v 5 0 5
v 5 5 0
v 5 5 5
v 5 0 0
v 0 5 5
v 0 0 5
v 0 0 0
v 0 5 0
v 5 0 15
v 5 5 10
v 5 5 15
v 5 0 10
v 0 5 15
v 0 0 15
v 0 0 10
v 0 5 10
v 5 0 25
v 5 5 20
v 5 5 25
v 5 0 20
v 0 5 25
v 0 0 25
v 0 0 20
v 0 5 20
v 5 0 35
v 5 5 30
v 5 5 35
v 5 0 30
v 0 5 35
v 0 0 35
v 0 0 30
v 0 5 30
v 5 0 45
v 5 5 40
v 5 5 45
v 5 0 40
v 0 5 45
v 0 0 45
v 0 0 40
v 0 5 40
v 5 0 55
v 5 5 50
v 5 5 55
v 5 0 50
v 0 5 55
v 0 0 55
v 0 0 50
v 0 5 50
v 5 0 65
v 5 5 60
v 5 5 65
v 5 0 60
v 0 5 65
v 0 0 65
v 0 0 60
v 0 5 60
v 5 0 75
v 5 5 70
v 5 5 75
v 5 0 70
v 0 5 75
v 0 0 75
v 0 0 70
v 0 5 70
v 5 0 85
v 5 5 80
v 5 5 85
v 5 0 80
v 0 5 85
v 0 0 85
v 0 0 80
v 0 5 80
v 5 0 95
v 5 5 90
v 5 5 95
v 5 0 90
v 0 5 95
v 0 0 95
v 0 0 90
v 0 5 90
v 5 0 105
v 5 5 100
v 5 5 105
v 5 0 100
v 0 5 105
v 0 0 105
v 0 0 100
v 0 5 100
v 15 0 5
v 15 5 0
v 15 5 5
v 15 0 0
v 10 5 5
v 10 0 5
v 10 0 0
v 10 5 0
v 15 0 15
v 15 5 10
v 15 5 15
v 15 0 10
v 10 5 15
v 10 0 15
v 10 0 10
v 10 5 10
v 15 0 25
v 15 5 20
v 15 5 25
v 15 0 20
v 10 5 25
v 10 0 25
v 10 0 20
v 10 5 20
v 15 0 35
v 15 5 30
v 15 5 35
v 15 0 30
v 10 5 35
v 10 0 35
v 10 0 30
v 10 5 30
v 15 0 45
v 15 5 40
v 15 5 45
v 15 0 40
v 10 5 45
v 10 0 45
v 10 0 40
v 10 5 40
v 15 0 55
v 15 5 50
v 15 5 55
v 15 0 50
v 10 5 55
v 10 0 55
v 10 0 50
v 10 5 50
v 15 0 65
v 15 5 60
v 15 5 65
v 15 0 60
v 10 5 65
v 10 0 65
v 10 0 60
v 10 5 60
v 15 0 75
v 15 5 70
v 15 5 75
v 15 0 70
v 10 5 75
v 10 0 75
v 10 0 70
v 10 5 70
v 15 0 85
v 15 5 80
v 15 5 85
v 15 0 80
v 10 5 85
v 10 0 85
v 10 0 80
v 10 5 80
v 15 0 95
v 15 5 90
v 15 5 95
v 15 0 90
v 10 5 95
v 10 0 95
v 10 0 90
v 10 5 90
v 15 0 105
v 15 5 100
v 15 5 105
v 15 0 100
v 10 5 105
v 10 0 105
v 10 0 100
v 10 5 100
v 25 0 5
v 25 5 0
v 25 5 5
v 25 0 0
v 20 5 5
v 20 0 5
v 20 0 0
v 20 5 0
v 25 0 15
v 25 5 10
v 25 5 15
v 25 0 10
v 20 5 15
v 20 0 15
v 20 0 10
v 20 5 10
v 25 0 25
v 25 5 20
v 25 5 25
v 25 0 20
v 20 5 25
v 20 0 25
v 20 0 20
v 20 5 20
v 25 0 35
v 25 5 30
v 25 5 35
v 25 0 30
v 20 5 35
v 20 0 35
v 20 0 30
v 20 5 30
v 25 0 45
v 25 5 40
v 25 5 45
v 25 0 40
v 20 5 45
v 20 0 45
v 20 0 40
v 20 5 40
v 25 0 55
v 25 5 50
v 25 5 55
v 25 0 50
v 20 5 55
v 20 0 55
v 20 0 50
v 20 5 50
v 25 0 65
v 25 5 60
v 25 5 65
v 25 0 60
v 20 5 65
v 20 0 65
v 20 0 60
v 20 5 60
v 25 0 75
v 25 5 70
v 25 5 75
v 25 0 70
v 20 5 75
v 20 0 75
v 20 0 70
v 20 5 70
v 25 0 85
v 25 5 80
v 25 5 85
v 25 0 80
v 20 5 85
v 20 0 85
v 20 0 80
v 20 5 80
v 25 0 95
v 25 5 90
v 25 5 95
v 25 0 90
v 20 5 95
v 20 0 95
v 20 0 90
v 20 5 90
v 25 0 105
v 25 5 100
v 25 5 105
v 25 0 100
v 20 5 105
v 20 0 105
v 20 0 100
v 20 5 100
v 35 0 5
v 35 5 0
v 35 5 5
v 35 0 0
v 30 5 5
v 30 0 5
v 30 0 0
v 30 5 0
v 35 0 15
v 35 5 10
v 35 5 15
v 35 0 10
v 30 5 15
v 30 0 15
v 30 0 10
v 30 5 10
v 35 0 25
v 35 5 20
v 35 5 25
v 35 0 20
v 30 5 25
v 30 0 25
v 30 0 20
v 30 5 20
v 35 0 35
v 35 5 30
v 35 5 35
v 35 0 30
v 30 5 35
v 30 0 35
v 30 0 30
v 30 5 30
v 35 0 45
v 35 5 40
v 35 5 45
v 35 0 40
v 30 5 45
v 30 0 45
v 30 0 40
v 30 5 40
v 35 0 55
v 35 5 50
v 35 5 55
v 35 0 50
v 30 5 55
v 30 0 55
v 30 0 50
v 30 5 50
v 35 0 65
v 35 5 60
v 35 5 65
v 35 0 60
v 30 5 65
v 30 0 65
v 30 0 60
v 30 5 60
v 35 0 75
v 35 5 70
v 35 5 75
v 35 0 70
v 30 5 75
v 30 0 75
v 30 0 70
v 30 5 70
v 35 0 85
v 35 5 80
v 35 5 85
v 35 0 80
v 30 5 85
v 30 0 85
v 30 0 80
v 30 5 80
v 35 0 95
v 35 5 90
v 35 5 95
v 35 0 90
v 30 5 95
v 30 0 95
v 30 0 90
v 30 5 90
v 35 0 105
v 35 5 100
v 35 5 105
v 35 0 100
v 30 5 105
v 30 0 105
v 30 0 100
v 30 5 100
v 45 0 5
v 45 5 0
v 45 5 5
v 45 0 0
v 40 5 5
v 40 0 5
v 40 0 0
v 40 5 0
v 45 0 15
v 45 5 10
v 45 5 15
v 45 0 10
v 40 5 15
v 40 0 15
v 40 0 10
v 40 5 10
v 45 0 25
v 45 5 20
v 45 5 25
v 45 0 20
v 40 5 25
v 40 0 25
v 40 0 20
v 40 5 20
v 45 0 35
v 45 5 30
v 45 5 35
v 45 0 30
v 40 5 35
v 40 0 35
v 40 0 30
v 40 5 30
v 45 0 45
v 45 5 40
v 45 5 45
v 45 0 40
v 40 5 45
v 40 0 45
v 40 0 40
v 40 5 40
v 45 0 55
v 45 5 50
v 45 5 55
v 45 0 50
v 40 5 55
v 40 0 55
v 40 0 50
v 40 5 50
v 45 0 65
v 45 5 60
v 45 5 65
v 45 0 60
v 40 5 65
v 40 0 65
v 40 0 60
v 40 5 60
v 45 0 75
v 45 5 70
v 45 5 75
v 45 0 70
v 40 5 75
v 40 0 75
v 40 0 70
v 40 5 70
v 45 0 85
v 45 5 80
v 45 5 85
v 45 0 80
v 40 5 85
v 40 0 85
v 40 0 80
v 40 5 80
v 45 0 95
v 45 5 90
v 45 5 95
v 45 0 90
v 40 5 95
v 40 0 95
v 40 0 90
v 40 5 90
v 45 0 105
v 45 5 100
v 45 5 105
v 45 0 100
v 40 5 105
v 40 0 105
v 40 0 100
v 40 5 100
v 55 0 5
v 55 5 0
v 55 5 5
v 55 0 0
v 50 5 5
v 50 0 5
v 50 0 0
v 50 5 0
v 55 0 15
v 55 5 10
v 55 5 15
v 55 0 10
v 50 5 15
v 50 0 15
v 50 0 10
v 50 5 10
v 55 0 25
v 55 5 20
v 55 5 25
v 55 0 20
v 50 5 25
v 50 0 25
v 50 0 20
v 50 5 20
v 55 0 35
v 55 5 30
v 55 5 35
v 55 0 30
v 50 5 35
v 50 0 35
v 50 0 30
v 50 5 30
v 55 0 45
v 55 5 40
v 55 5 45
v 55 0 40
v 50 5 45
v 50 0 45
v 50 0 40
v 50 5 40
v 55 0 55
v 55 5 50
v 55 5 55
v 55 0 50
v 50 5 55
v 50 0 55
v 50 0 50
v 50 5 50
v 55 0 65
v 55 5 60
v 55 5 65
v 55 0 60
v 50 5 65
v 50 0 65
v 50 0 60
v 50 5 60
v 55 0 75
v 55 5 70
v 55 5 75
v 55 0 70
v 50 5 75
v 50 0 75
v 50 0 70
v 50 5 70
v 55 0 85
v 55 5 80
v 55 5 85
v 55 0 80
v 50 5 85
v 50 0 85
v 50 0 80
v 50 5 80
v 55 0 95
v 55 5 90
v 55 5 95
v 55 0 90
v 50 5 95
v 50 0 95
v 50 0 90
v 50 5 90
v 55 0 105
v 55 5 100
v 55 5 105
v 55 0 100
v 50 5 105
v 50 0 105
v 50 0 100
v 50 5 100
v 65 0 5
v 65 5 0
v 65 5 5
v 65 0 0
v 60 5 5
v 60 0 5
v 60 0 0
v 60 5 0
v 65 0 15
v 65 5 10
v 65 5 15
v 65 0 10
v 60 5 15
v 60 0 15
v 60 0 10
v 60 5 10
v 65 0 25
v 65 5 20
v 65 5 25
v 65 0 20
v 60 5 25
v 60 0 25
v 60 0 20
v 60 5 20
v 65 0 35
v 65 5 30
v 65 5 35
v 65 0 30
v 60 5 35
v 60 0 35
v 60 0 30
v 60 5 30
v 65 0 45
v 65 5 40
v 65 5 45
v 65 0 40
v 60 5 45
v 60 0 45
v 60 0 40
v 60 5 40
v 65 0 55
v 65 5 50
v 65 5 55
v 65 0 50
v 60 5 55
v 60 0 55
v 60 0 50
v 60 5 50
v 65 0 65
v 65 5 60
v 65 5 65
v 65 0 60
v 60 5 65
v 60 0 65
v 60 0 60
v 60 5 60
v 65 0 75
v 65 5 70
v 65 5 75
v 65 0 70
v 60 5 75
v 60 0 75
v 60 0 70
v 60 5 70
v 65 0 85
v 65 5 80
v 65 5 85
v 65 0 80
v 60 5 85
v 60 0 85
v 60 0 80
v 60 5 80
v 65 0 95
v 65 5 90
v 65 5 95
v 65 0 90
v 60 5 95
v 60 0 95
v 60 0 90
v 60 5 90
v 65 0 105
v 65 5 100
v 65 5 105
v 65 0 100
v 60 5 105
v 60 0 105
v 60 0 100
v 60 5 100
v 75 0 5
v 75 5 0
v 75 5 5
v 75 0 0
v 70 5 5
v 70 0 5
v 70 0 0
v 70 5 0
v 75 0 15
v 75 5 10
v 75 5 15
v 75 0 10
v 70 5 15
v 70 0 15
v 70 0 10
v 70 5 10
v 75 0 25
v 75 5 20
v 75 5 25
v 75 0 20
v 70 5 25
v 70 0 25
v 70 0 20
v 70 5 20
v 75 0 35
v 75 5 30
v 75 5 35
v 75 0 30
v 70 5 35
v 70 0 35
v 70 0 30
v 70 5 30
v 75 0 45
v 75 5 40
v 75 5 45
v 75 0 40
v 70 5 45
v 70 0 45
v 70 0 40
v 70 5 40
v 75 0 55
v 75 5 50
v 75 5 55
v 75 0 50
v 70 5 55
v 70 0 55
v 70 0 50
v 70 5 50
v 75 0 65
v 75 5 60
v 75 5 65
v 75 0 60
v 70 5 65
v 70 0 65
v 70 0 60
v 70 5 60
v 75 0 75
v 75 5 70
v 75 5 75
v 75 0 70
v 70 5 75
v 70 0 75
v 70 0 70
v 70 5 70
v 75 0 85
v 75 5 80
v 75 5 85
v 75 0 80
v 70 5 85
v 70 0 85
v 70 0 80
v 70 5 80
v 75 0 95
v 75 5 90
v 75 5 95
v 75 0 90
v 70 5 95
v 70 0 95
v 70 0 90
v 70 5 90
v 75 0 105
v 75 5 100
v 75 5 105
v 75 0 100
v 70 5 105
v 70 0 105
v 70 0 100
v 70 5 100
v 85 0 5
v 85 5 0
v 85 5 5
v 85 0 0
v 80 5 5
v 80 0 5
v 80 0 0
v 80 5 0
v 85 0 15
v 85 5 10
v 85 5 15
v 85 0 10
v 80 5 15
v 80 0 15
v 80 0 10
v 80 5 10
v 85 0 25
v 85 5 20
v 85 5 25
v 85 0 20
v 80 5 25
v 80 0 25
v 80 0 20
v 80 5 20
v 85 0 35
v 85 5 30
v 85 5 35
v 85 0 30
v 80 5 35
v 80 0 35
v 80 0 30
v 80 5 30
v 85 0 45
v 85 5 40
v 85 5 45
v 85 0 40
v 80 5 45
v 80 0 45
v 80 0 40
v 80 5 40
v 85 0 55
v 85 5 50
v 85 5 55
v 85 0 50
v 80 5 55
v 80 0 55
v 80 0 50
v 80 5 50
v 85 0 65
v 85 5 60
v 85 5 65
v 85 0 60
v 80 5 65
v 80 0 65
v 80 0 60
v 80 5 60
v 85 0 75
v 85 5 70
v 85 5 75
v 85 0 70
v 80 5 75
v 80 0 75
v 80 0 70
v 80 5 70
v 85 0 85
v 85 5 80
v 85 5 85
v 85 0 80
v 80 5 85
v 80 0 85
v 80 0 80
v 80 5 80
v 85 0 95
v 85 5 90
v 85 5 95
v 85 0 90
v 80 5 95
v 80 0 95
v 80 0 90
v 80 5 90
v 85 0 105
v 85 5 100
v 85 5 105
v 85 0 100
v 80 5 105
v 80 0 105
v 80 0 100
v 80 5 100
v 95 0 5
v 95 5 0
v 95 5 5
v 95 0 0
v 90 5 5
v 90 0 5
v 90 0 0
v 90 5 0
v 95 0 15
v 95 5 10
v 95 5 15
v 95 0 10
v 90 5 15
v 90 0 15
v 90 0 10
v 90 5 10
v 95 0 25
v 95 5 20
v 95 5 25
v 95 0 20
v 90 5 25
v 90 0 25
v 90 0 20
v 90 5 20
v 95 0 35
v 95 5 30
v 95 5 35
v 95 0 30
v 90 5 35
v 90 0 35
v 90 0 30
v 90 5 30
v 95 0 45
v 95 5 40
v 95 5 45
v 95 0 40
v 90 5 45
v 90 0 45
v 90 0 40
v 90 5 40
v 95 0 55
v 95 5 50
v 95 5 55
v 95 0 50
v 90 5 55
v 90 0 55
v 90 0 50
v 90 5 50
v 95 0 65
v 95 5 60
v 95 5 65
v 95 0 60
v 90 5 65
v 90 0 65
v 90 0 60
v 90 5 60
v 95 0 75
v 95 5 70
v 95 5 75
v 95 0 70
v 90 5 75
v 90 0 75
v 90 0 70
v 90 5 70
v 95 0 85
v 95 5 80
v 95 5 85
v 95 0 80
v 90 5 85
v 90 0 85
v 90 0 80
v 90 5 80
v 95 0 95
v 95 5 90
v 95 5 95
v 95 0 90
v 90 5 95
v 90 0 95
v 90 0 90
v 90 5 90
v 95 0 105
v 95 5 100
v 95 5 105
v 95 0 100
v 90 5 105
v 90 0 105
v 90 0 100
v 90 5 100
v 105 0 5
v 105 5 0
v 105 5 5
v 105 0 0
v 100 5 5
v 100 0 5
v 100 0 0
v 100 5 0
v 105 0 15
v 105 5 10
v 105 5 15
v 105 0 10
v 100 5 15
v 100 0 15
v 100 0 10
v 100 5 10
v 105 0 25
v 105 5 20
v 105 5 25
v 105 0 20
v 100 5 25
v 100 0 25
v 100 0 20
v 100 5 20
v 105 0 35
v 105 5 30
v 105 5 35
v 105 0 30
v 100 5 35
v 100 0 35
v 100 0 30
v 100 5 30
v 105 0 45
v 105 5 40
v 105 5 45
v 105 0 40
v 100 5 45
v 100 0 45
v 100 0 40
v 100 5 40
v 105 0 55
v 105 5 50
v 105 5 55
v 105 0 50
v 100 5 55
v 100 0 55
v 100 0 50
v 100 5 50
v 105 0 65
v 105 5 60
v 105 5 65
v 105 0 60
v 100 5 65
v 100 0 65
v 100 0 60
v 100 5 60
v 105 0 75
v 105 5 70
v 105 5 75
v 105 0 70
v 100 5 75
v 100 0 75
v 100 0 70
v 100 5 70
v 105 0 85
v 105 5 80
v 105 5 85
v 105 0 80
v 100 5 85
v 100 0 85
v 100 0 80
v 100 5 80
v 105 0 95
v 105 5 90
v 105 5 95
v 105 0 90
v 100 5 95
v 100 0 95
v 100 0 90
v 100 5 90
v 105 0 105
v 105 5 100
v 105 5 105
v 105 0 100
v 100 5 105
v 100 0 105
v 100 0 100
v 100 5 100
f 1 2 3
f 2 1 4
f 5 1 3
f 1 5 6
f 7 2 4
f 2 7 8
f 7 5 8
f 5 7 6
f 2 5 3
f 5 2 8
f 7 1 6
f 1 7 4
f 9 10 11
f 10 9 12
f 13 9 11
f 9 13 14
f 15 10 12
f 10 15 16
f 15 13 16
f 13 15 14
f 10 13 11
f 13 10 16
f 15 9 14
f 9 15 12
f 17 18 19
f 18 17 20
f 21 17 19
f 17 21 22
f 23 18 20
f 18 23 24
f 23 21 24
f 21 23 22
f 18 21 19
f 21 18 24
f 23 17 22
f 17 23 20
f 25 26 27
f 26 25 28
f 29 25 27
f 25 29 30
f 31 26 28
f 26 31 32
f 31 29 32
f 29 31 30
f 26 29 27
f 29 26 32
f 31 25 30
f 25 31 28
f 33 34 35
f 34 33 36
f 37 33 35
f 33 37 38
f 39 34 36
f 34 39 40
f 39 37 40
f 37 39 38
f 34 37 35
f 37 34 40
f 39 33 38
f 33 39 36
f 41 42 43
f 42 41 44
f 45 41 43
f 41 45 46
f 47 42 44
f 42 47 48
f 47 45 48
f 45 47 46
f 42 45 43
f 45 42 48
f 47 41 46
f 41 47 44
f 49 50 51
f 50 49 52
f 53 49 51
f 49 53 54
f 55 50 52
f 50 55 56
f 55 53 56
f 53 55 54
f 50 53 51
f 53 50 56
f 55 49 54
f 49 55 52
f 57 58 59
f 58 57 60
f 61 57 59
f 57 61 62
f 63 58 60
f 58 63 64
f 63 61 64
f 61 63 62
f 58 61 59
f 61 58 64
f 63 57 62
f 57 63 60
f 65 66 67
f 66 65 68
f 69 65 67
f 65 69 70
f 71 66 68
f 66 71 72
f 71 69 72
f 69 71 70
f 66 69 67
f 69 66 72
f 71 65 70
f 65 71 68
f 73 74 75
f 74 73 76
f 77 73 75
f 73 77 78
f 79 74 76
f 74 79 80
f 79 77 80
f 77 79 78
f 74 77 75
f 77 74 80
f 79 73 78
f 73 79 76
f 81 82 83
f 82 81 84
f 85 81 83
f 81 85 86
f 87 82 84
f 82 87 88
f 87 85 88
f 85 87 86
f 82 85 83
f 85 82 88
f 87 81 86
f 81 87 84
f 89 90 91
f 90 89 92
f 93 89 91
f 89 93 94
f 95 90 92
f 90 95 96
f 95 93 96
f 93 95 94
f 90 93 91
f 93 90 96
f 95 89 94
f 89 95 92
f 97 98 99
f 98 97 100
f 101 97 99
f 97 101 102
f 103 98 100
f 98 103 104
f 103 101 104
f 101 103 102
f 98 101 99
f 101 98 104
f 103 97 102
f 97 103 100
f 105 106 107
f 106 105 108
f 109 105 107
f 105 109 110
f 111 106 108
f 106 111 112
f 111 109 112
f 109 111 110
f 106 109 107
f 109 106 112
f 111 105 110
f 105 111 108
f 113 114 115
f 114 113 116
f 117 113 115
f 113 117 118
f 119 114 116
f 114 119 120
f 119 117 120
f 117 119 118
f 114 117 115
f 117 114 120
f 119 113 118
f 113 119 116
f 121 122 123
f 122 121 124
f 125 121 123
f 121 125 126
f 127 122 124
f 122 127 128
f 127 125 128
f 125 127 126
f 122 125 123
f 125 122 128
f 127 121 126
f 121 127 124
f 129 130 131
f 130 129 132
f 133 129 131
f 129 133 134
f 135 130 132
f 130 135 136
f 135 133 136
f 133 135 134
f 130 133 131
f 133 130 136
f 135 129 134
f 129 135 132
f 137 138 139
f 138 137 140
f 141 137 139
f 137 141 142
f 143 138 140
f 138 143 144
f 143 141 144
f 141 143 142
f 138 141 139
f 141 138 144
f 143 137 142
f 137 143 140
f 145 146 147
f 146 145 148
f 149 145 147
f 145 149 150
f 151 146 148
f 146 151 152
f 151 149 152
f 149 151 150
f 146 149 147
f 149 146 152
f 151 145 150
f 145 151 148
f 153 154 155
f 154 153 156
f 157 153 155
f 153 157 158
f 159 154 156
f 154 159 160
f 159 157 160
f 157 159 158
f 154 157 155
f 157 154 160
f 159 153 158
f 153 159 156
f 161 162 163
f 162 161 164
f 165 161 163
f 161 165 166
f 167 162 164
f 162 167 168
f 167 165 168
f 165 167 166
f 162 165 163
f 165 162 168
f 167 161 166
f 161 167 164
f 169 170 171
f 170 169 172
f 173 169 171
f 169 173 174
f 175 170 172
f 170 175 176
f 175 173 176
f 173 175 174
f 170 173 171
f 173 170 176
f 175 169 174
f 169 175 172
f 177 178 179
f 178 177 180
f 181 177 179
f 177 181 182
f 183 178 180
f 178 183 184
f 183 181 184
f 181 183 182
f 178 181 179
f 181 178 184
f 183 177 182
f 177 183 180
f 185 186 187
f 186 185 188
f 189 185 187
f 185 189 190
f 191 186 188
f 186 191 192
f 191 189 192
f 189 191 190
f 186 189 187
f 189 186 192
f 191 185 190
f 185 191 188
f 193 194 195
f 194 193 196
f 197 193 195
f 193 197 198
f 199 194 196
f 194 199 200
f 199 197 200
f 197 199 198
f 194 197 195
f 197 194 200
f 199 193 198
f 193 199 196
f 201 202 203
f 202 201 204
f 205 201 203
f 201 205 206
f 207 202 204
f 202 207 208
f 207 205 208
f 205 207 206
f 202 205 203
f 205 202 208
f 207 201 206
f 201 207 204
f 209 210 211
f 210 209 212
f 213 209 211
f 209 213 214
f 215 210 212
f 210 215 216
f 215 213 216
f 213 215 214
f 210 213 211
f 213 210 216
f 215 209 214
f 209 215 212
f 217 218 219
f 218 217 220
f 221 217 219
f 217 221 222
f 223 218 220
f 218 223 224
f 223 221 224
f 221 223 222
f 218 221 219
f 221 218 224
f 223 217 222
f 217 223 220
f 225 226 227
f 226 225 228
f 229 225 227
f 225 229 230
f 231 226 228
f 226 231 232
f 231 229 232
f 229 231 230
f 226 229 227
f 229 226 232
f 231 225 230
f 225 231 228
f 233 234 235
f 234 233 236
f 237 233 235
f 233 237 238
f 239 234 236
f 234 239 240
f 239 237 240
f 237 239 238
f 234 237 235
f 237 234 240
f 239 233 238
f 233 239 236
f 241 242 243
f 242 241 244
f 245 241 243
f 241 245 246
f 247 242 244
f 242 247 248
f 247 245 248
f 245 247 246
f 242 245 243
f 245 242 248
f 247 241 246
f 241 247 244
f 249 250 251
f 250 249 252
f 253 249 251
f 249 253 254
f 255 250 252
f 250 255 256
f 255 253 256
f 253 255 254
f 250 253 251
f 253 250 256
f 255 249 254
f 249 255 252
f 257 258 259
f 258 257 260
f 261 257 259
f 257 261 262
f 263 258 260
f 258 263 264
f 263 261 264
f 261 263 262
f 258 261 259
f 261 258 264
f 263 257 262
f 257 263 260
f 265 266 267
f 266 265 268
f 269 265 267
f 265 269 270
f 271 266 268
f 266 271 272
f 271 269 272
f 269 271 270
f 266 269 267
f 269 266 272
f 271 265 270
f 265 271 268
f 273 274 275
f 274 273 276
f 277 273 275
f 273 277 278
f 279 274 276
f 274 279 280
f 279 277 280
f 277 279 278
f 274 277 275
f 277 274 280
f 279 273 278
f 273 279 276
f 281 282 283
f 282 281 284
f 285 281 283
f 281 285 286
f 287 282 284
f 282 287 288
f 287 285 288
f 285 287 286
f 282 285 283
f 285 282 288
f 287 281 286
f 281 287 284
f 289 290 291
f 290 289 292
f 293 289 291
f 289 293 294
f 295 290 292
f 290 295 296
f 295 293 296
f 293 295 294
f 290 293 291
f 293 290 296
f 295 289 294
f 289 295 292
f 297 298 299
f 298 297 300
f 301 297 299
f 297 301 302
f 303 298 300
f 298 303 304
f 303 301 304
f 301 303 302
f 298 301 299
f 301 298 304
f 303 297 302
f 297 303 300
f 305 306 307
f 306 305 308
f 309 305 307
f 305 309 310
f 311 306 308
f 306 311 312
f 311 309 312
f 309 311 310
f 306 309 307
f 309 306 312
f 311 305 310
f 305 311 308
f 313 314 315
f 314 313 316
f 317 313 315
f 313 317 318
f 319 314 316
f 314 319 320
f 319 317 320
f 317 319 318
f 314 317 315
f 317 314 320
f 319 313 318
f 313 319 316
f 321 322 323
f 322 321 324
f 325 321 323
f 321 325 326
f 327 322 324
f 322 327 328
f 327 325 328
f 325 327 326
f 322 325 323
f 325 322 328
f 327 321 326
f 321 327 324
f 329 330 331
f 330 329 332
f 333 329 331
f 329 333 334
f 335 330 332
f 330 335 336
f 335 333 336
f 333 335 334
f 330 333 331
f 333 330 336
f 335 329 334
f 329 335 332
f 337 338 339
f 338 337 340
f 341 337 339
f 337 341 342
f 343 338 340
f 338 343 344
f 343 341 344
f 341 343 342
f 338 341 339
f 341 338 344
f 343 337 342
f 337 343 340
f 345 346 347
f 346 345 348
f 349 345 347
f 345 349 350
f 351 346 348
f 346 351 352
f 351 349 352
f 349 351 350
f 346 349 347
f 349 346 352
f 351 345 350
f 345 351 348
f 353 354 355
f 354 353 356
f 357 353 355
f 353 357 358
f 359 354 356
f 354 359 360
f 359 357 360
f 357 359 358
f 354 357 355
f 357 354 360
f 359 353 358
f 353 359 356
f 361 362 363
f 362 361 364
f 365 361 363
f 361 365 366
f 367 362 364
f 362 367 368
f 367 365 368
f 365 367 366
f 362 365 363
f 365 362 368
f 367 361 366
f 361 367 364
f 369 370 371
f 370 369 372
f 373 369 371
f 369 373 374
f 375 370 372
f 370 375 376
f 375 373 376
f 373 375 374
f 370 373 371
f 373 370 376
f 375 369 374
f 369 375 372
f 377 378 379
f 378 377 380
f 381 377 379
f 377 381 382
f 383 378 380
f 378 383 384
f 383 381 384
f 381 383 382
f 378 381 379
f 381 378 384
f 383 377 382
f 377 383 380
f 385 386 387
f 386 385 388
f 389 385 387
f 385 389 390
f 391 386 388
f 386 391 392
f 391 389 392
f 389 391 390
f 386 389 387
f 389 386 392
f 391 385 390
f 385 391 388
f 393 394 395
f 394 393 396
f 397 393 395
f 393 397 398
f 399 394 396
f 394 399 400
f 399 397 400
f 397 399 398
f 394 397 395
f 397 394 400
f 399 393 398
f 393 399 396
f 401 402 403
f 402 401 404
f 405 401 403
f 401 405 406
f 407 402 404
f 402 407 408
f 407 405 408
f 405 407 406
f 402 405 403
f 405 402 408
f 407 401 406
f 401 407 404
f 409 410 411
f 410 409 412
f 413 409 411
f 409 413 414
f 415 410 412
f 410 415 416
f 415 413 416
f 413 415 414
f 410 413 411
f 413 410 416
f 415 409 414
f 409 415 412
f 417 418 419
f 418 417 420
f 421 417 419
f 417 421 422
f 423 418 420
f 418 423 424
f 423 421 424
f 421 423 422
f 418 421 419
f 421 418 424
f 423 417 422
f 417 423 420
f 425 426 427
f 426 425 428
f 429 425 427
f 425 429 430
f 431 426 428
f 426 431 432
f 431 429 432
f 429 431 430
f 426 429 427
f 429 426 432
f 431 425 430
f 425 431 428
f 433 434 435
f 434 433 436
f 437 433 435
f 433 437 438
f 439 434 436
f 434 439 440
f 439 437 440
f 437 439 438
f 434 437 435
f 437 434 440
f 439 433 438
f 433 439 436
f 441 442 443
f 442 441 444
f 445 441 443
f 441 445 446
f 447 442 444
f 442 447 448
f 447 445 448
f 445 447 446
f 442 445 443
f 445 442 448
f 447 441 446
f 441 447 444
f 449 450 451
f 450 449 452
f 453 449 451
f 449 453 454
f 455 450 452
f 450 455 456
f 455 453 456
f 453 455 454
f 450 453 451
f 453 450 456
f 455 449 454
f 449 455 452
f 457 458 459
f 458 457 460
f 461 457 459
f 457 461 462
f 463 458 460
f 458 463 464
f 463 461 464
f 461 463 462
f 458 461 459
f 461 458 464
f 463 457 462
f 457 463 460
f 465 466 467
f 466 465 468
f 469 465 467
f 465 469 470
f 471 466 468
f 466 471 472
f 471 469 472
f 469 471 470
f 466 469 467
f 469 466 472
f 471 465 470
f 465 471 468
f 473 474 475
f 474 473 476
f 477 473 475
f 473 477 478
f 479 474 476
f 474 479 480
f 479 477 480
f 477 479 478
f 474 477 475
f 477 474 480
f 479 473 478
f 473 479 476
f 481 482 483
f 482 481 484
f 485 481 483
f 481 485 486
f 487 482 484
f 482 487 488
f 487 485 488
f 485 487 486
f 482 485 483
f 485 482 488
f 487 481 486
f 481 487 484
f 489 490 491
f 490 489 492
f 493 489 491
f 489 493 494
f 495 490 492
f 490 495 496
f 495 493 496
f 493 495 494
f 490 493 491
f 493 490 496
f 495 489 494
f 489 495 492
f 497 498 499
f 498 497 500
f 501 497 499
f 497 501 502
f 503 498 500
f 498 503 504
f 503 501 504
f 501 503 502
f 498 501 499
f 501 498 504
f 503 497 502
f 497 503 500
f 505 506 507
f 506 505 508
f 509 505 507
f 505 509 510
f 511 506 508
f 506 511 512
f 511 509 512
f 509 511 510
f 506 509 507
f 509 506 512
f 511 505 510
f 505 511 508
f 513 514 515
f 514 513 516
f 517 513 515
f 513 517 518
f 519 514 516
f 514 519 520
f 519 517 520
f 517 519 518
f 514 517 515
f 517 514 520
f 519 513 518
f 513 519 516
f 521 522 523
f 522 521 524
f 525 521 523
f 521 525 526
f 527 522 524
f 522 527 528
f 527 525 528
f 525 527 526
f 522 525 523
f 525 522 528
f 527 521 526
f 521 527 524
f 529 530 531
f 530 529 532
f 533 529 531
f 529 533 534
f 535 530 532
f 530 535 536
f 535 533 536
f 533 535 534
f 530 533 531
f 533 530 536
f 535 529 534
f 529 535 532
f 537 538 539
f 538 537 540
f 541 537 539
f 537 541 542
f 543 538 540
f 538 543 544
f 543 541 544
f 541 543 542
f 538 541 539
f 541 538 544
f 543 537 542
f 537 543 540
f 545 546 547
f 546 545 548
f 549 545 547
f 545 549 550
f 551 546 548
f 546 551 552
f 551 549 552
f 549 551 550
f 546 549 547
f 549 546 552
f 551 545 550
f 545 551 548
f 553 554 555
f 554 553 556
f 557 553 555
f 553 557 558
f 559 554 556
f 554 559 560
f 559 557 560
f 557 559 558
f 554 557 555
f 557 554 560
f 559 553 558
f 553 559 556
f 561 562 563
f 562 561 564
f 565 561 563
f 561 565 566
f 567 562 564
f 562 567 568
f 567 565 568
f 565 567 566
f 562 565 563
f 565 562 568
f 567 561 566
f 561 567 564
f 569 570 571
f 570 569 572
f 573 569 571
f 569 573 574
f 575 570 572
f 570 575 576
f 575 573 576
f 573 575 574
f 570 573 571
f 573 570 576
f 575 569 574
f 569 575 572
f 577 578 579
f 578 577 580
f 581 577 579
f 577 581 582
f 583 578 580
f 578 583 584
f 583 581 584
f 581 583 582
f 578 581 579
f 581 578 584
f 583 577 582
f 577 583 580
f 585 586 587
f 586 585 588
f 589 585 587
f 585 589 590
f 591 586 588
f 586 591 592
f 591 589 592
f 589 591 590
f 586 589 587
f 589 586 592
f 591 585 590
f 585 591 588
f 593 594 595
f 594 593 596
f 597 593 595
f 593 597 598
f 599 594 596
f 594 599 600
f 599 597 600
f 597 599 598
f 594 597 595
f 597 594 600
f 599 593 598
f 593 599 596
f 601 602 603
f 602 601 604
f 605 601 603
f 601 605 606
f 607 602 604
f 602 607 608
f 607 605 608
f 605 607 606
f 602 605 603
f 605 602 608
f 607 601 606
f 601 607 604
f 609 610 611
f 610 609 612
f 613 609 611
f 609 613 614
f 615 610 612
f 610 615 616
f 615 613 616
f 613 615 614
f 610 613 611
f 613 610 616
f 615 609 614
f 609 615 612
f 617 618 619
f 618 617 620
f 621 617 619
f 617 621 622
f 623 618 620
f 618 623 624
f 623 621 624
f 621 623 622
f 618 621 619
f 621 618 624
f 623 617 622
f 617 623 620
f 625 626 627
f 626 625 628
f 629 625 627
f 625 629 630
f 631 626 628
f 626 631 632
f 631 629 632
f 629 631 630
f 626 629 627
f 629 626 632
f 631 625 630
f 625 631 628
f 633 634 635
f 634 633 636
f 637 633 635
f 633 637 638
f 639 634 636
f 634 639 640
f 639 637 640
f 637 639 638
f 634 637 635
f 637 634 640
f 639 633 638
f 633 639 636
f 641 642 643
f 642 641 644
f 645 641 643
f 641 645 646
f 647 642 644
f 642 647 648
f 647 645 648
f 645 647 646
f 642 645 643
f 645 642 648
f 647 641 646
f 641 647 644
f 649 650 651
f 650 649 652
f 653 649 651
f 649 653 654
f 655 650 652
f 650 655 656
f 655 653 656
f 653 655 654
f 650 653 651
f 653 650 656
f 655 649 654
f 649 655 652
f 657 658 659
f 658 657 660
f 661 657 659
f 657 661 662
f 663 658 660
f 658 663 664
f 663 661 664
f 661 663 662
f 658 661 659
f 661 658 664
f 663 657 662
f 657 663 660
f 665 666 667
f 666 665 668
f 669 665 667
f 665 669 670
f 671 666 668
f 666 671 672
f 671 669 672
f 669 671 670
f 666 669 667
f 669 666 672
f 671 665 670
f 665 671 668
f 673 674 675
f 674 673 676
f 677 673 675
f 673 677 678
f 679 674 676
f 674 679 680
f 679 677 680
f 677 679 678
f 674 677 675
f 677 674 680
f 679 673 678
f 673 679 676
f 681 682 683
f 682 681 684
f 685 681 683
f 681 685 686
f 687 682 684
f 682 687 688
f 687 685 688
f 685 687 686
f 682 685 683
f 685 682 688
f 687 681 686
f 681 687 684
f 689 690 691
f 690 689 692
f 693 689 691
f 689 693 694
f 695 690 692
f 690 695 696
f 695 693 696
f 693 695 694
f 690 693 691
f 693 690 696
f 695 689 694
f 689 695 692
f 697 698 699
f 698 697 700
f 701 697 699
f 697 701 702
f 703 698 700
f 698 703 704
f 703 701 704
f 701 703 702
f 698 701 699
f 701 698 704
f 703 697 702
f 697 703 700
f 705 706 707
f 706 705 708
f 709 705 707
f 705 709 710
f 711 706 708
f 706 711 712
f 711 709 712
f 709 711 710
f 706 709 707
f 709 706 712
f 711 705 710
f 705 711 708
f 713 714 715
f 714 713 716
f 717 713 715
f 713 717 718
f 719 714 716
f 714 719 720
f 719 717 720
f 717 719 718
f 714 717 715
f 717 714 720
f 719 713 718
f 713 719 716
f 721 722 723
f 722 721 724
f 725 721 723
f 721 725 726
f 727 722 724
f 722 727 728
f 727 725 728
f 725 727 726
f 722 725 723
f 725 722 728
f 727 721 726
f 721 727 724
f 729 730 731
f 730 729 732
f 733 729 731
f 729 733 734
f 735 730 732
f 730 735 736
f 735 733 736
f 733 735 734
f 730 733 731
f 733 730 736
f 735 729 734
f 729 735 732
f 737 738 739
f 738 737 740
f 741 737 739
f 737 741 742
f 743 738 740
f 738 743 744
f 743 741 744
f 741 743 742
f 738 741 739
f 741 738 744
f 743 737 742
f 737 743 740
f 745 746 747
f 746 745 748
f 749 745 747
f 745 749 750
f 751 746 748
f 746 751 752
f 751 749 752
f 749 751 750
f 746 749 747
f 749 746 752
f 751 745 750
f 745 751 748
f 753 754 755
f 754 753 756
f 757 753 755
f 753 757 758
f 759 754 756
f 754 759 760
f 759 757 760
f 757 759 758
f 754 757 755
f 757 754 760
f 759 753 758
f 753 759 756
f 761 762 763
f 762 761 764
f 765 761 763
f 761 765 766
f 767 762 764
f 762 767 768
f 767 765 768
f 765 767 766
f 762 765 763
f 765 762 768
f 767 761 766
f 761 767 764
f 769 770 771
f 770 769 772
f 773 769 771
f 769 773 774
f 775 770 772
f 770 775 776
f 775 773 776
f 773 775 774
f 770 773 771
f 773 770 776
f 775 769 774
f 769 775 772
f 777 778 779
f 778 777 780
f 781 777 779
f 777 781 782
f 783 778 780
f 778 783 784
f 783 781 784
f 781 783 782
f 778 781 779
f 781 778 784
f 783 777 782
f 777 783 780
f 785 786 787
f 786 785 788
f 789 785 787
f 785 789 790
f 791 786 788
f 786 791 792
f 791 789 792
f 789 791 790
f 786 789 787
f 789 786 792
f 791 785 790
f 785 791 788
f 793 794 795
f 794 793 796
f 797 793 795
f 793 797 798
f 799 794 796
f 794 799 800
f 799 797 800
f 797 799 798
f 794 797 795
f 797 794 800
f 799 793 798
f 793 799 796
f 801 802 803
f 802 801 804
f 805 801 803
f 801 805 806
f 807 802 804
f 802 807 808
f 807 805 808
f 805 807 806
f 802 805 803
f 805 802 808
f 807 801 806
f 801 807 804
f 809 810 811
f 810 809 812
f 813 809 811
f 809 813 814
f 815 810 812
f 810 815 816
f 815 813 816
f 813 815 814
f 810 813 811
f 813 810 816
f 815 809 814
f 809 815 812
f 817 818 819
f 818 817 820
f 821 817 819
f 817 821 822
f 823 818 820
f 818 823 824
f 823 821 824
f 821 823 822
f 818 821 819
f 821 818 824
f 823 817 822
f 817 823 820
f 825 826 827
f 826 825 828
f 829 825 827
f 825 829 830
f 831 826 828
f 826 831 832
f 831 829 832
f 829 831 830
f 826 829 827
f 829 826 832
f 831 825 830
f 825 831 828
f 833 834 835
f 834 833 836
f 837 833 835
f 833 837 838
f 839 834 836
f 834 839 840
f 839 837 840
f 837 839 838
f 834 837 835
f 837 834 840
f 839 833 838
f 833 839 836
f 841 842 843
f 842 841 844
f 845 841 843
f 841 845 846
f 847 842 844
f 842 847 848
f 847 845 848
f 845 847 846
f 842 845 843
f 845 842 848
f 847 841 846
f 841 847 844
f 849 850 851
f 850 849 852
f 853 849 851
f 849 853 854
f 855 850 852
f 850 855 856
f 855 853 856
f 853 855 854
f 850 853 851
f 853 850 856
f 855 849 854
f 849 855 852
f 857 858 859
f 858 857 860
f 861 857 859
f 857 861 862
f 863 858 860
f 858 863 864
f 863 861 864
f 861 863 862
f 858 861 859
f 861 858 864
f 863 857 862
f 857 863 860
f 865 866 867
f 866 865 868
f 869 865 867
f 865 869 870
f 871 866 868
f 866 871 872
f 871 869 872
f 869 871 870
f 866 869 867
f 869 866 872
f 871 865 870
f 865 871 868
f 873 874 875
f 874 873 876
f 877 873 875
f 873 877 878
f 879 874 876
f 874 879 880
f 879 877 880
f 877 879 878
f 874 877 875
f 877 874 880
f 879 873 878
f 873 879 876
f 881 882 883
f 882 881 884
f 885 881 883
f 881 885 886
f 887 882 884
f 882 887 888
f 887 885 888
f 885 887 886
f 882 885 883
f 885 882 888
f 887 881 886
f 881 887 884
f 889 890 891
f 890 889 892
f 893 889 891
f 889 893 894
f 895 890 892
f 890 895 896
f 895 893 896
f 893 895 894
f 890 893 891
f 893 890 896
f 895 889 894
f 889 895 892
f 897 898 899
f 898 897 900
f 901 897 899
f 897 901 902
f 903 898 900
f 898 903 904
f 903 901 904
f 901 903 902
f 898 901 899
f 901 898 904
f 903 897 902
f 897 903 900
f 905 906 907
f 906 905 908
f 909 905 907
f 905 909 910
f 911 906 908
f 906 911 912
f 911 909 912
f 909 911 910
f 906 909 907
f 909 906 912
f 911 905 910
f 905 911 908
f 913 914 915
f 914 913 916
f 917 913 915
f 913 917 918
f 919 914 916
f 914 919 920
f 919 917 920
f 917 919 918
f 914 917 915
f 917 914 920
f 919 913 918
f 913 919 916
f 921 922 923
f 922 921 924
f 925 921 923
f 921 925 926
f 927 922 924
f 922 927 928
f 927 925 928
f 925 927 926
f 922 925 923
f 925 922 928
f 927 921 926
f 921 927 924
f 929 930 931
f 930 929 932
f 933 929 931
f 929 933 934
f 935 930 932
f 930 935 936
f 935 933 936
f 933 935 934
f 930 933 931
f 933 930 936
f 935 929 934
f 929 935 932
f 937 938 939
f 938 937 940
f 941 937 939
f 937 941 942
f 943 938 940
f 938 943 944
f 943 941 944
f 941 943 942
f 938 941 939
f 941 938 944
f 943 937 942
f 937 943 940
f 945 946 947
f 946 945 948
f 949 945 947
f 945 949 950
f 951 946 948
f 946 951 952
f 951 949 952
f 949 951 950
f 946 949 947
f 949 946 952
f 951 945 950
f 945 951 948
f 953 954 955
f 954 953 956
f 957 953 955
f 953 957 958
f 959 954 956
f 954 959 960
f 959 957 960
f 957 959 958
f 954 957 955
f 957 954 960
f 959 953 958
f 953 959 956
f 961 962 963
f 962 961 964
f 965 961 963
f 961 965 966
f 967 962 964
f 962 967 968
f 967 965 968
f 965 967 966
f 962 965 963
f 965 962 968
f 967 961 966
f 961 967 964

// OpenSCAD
module foo() {
  for(x = [0:10]) {
    for(z = [0:10]) {
      translate([x*10, 0, z*10])
        cube([5, 5, 5]);
    }
  }
}

foo();
